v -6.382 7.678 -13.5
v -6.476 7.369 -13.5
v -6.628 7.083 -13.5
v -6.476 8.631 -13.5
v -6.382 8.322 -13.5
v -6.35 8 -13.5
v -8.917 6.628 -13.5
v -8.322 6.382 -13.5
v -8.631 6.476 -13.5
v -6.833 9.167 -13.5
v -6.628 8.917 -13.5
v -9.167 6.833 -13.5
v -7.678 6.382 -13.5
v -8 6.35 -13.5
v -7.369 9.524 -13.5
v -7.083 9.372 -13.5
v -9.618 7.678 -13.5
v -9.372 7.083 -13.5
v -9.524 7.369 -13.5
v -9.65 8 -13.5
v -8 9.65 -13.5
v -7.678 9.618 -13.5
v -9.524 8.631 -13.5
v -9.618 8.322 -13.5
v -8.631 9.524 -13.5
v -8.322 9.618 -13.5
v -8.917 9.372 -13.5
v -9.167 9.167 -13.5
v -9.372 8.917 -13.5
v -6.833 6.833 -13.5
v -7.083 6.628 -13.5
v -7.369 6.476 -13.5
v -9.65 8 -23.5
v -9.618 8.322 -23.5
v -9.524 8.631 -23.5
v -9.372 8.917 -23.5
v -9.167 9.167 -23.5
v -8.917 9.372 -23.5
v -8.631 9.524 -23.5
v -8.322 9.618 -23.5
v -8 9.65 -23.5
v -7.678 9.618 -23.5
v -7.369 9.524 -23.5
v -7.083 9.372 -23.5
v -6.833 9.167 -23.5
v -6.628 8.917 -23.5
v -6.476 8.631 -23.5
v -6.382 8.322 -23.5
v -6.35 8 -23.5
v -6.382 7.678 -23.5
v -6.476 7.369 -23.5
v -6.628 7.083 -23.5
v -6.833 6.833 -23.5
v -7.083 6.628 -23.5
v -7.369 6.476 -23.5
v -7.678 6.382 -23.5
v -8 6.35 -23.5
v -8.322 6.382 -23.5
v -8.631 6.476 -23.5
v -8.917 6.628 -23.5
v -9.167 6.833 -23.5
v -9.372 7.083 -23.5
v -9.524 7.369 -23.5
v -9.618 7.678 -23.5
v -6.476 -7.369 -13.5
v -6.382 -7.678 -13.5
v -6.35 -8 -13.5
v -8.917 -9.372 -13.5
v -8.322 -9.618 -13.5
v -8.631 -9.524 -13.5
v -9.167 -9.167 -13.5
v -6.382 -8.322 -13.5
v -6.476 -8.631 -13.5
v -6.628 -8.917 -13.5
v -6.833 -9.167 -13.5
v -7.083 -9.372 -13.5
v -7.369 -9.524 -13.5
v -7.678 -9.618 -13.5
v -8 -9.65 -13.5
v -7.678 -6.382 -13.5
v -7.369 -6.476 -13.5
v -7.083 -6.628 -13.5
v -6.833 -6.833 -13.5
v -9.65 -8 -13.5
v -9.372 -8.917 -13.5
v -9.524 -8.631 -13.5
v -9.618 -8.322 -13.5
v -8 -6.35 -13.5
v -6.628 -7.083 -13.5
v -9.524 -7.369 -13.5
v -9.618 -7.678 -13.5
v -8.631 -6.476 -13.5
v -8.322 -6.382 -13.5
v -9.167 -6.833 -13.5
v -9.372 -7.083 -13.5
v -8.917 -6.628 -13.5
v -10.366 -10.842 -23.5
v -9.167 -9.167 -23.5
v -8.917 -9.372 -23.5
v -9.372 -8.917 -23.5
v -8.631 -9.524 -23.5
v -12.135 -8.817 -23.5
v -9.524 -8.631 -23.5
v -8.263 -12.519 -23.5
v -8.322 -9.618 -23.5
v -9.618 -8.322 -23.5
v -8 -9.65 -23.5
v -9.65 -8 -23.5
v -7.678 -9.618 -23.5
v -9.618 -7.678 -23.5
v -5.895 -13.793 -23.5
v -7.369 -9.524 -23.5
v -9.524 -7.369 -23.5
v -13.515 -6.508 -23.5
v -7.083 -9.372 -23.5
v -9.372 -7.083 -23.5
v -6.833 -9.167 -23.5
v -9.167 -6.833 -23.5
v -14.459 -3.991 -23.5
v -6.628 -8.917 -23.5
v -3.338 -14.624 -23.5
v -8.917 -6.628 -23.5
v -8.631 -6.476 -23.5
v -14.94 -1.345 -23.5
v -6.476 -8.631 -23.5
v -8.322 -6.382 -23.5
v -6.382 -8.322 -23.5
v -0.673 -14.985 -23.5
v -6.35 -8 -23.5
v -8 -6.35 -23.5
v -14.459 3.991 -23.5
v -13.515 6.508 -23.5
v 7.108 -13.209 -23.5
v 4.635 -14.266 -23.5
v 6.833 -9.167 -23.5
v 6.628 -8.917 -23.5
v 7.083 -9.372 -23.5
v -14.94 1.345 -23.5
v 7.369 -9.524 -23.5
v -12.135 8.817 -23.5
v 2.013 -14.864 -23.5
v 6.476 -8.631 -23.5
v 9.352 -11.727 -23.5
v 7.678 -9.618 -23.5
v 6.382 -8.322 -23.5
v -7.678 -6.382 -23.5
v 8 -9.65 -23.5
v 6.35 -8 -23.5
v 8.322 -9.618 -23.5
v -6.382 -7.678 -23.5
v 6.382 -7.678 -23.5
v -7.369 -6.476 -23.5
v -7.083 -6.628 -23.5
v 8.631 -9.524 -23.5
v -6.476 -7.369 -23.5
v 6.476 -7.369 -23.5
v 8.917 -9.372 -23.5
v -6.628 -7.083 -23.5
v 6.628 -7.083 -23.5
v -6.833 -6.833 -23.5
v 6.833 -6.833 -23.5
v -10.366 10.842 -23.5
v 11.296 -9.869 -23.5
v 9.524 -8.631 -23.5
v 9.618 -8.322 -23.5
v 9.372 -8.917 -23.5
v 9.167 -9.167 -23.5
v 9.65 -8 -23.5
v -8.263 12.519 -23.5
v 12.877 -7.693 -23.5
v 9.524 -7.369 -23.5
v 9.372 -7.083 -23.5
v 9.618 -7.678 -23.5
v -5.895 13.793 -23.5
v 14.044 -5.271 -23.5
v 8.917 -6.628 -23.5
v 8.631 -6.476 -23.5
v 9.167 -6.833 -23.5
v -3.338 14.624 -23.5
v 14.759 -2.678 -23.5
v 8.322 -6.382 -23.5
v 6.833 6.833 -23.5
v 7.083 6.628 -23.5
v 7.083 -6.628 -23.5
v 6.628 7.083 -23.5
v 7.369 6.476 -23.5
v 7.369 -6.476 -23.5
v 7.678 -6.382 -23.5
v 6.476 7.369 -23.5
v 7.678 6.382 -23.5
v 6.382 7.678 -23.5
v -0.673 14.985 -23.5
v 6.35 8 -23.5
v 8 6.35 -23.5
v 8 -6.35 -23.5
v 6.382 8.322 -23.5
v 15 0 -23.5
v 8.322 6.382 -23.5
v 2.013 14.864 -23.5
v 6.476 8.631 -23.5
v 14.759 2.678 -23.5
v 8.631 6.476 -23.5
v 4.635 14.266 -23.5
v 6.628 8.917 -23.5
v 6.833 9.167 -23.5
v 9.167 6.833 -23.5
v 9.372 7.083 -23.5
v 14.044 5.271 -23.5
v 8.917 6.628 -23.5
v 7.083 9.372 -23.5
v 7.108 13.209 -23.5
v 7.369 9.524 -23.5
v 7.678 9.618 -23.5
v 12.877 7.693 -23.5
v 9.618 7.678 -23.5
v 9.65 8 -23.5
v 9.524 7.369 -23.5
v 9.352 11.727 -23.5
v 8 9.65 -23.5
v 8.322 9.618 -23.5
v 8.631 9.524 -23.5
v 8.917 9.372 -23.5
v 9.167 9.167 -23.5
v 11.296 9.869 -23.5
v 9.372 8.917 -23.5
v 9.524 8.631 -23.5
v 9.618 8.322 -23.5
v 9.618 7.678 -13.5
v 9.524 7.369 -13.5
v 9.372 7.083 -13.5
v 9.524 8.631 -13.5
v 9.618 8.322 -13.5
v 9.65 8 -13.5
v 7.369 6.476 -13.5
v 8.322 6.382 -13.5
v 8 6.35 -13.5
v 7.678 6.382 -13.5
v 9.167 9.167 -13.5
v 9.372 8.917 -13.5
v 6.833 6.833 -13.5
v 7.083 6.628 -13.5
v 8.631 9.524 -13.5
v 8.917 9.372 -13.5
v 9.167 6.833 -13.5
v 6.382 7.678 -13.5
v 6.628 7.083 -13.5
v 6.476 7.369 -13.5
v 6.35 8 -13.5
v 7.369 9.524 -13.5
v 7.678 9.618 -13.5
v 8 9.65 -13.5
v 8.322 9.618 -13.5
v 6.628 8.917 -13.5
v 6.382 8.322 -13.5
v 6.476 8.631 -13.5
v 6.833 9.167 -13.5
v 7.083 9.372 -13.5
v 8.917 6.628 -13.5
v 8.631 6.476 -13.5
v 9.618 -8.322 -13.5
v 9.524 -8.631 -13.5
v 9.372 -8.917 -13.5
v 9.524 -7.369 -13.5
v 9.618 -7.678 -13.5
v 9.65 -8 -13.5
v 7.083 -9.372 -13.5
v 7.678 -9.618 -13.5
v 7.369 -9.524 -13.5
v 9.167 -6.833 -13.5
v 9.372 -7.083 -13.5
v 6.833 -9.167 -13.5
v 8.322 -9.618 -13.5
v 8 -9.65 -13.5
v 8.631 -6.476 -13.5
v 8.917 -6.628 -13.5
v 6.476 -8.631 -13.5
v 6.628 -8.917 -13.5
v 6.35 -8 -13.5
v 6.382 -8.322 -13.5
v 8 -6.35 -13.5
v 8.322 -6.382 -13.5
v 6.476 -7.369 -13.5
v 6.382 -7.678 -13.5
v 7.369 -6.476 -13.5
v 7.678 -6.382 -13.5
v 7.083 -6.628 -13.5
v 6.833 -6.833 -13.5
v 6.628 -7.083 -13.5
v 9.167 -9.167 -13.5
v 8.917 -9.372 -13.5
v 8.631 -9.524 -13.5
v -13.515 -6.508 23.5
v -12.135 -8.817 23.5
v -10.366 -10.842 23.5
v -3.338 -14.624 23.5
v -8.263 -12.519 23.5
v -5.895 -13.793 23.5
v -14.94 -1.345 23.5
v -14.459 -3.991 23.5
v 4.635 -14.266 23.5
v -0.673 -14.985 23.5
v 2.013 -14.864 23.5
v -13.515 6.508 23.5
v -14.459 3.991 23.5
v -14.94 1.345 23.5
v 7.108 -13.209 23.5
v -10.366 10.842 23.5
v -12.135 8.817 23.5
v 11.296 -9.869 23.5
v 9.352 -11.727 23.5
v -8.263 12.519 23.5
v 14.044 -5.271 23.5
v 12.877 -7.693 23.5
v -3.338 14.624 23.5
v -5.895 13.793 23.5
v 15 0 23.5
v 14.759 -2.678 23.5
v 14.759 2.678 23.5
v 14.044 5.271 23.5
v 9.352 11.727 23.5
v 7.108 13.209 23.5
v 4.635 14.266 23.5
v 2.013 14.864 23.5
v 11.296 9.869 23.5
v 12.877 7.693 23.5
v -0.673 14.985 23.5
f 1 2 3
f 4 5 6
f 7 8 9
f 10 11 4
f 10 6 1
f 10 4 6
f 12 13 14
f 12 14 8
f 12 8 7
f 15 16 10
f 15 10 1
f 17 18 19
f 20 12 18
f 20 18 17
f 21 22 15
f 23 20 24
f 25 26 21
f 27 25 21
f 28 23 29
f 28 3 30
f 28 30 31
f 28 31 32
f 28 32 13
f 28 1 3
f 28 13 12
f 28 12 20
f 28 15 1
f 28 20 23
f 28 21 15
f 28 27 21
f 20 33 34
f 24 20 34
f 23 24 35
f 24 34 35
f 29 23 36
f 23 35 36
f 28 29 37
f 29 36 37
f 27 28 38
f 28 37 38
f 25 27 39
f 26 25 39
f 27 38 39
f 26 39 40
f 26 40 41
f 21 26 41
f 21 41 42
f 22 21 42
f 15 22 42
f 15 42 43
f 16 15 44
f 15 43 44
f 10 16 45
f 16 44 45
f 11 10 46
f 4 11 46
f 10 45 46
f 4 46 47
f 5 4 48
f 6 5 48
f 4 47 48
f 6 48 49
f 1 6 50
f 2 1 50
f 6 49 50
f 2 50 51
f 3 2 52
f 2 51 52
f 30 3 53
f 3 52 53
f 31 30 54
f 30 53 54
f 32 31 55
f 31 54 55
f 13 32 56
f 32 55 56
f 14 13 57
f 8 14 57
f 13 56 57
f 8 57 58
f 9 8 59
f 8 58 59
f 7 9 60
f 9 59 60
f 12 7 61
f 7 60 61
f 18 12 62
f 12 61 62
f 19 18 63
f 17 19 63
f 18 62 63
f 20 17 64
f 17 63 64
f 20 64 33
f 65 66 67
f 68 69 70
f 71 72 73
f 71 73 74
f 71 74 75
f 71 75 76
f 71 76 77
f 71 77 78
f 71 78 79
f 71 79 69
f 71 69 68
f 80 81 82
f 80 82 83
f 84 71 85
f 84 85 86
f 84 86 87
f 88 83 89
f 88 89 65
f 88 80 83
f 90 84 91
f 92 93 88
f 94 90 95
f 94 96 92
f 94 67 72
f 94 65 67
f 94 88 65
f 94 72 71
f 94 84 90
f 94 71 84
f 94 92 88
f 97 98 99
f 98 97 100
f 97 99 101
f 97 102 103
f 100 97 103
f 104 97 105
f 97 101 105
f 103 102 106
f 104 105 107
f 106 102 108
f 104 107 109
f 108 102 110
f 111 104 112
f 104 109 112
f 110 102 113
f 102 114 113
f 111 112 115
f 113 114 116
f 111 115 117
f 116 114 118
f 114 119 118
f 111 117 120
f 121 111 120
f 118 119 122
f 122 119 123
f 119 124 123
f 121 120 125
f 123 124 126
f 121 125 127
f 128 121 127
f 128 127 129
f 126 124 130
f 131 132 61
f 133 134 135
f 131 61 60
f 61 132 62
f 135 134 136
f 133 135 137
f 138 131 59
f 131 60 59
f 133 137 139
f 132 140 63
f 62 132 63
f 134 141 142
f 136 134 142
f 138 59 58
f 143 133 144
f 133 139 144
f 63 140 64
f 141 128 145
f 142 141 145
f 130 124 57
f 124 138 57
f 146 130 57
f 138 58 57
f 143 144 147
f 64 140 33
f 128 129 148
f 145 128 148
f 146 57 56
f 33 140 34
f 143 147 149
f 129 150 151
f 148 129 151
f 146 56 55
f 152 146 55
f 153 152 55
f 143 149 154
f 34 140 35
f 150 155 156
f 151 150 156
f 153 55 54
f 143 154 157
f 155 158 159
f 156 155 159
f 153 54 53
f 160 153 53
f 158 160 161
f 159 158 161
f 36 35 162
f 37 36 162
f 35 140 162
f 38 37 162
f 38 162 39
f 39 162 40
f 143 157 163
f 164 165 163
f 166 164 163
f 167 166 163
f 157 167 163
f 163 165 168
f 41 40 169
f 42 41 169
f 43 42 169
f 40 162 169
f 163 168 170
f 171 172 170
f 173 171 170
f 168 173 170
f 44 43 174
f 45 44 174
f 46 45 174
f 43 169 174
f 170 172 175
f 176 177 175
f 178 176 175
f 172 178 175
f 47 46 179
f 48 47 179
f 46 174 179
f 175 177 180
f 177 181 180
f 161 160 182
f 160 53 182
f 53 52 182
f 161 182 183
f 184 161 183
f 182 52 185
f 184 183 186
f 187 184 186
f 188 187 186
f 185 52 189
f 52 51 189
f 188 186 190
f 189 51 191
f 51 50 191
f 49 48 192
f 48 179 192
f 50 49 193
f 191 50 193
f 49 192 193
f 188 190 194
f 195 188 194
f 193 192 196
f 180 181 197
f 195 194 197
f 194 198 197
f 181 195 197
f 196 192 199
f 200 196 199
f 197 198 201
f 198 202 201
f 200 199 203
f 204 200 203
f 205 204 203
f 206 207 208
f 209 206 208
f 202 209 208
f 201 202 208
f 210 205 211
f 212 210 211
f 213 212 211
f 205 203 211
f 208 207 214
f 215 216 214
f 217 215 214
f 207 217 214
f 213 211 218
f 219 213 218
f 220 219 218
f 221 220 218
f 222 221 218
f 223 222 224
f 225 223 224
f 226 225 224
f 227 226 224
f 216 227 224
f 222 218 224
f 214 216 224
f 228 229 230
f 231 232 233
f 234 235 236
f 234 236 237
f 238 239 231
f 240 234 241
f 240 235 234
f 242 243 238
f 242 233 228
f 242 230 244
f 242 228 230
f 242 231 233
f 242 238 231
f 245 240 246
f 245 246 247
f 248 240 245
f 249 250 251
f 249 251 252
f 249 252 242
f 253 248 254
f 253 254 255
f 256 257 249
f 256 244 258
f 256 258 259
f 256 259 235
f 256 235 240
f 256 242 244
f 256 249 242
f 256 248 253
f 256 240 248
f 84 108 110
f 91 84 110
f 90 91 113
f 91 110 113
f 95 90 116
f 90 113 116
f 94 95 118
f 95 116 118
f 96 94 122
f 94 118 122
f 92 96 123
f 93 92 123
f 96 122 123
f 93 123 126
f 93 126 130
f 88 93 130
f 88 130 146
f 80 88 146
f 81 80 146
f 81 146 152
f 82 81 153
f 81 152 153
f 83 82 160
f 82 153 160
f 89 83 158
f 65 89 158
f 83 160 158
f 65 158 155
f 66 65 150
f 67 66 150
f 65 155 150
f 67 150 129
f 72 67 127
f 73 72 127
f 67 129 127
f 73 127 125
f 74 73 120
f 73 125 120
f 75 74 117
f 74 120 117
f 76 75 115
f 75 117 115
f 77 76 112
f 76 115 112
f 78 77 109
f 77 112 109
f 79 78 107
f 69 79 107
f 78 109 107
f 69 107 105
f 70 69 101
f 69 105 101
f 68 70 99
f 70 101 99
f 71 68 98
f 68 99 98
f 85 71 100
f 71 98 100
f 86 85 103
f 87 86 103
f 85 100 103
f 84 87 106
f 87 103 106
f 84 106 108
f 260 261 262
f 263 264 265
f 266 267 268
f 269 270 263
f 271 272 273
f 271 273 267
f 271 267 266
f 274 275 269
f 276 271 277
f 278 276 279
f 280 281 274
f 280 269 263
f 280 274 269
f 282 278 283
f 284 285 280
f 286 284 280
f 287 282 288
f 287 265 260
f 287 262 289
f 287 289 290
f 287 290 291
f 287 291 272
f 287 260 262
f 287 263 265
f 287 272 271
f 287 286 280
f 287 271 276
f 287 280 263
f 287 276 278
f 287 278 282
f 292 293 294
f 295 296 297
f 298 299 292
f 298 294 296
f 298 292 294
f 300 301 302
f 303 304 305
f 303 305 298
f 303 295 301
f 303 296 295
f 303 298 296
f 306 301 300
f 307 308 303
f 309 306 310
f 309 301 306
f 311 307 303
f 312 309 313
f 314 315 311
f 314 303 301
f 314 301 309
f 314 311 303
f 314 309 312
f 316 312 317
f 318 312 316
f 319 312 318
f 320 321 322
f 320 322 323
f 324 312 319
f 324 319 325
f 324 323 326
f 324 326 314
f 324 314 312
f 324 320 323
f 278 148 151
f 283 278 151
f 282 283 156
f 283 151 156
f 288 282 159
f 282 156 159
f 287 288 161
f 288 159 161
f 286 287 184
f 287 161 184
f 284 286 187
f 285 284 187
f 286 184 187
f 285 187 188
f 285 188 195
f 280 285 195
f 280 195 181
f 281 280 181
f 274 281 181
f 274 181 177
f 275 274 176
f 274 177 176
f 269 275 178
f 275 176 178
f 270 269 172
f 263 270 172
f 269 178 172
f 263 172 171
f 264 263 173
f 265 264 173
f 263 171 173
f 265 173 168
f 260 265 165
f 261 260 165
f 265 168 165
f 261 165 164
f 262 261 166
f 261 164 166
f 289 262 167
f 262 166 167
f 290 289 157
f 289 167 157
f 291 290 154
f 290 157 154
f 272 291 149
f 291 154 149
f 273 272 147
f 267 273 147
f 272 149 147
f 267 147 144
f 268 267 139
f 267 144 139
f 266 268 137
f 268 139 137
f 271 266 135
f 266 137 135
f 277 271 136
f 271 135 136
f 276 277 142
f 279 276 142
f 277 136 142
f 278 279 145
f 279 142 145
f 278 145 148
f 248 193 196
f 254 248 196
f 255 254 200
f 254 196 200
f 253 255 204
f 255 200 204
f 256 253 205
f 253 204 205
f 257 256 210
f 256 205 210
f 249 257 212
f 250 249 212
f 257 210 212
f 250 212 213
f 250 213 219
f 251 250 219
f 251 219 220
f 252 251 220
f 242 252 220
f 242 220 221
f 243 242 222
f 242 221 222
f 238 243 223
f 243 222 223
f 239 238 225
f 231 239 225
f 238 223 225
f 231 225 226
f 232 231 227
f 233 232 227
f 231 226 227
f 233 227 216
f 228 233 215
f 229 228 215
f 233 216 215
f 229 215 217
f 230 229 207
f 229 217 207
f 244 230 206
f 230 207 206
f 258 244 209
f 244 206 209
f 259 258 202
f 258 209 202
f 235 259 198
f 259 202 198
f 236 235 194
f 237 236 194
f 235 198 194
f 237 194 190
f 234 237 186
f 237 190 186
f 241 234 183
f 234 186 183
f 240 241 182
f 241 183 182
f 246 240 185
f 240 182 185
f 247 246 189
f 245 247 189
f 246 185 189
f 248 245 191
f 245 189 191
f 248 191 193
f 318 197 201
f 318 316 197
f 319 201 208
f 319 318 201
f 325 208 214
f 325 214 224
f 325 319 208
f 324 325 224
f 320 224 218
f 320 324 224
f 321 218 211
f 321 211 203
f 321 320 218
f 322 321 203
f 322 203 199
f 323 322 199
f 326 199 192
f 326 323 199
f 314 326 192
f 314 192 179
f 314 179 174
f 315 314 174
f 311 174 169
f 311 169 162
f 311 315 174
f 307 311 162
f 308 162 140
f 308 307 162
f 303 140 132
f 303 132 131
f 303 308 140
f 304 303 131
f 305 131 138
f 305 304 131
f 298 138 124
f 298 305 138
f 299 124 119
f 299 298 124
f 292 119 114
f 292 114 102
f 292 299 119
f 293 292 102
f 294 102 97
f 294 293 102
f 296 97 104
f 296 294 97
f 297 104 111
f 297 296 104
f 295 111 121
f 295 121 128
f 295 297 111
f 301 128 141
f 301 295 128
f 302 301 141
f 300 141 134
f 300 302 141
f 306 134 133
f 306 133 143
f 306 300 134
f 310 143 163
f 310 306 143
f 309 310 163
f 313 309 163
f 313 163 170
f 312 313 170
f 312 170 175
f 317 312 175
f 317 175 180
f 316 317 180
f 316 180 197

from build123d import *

# Parameters (mm, degrees)
SKETCH1_R           = 15
BOSS_EXTRUDE1_DEPTH = 23.5
SKETCH2_R           = 1.65
CUT_EXTRUDE1_DEPTH  = 10


with BuildPart() as part:
    # Sketch1 → Boss-Extrude1 (new, symmetric)
    with BuildSketch(Plane.XY):
        Circle(SKETCH1_R)
    extrude(amount=BOSS_EXTRUDE1_DEPTH, both=True)

    # Sketch2 → Cut-Extrude1 (cut)
    with BuildSketch(Plane(origin=(0, 0, -23.5), x_dir=(-1, 0, 0), z_dir=(0, 0, -1))):
        with Locations((8, 8)):
            Circle(SKETCH2_R)
        with Locations((8, -8)):
            Circle(SKETCH2_R)
        with Locations((-8, -8)):
            Circle(SKETCH2_R)
        with Locations((-8, 8)):
            Circle(SKETCH2_R)
    extrude(amount=-CUT_EXTRUDE1_DEPTH, mode=Mode.SUBTRACT)


solid = part.part
